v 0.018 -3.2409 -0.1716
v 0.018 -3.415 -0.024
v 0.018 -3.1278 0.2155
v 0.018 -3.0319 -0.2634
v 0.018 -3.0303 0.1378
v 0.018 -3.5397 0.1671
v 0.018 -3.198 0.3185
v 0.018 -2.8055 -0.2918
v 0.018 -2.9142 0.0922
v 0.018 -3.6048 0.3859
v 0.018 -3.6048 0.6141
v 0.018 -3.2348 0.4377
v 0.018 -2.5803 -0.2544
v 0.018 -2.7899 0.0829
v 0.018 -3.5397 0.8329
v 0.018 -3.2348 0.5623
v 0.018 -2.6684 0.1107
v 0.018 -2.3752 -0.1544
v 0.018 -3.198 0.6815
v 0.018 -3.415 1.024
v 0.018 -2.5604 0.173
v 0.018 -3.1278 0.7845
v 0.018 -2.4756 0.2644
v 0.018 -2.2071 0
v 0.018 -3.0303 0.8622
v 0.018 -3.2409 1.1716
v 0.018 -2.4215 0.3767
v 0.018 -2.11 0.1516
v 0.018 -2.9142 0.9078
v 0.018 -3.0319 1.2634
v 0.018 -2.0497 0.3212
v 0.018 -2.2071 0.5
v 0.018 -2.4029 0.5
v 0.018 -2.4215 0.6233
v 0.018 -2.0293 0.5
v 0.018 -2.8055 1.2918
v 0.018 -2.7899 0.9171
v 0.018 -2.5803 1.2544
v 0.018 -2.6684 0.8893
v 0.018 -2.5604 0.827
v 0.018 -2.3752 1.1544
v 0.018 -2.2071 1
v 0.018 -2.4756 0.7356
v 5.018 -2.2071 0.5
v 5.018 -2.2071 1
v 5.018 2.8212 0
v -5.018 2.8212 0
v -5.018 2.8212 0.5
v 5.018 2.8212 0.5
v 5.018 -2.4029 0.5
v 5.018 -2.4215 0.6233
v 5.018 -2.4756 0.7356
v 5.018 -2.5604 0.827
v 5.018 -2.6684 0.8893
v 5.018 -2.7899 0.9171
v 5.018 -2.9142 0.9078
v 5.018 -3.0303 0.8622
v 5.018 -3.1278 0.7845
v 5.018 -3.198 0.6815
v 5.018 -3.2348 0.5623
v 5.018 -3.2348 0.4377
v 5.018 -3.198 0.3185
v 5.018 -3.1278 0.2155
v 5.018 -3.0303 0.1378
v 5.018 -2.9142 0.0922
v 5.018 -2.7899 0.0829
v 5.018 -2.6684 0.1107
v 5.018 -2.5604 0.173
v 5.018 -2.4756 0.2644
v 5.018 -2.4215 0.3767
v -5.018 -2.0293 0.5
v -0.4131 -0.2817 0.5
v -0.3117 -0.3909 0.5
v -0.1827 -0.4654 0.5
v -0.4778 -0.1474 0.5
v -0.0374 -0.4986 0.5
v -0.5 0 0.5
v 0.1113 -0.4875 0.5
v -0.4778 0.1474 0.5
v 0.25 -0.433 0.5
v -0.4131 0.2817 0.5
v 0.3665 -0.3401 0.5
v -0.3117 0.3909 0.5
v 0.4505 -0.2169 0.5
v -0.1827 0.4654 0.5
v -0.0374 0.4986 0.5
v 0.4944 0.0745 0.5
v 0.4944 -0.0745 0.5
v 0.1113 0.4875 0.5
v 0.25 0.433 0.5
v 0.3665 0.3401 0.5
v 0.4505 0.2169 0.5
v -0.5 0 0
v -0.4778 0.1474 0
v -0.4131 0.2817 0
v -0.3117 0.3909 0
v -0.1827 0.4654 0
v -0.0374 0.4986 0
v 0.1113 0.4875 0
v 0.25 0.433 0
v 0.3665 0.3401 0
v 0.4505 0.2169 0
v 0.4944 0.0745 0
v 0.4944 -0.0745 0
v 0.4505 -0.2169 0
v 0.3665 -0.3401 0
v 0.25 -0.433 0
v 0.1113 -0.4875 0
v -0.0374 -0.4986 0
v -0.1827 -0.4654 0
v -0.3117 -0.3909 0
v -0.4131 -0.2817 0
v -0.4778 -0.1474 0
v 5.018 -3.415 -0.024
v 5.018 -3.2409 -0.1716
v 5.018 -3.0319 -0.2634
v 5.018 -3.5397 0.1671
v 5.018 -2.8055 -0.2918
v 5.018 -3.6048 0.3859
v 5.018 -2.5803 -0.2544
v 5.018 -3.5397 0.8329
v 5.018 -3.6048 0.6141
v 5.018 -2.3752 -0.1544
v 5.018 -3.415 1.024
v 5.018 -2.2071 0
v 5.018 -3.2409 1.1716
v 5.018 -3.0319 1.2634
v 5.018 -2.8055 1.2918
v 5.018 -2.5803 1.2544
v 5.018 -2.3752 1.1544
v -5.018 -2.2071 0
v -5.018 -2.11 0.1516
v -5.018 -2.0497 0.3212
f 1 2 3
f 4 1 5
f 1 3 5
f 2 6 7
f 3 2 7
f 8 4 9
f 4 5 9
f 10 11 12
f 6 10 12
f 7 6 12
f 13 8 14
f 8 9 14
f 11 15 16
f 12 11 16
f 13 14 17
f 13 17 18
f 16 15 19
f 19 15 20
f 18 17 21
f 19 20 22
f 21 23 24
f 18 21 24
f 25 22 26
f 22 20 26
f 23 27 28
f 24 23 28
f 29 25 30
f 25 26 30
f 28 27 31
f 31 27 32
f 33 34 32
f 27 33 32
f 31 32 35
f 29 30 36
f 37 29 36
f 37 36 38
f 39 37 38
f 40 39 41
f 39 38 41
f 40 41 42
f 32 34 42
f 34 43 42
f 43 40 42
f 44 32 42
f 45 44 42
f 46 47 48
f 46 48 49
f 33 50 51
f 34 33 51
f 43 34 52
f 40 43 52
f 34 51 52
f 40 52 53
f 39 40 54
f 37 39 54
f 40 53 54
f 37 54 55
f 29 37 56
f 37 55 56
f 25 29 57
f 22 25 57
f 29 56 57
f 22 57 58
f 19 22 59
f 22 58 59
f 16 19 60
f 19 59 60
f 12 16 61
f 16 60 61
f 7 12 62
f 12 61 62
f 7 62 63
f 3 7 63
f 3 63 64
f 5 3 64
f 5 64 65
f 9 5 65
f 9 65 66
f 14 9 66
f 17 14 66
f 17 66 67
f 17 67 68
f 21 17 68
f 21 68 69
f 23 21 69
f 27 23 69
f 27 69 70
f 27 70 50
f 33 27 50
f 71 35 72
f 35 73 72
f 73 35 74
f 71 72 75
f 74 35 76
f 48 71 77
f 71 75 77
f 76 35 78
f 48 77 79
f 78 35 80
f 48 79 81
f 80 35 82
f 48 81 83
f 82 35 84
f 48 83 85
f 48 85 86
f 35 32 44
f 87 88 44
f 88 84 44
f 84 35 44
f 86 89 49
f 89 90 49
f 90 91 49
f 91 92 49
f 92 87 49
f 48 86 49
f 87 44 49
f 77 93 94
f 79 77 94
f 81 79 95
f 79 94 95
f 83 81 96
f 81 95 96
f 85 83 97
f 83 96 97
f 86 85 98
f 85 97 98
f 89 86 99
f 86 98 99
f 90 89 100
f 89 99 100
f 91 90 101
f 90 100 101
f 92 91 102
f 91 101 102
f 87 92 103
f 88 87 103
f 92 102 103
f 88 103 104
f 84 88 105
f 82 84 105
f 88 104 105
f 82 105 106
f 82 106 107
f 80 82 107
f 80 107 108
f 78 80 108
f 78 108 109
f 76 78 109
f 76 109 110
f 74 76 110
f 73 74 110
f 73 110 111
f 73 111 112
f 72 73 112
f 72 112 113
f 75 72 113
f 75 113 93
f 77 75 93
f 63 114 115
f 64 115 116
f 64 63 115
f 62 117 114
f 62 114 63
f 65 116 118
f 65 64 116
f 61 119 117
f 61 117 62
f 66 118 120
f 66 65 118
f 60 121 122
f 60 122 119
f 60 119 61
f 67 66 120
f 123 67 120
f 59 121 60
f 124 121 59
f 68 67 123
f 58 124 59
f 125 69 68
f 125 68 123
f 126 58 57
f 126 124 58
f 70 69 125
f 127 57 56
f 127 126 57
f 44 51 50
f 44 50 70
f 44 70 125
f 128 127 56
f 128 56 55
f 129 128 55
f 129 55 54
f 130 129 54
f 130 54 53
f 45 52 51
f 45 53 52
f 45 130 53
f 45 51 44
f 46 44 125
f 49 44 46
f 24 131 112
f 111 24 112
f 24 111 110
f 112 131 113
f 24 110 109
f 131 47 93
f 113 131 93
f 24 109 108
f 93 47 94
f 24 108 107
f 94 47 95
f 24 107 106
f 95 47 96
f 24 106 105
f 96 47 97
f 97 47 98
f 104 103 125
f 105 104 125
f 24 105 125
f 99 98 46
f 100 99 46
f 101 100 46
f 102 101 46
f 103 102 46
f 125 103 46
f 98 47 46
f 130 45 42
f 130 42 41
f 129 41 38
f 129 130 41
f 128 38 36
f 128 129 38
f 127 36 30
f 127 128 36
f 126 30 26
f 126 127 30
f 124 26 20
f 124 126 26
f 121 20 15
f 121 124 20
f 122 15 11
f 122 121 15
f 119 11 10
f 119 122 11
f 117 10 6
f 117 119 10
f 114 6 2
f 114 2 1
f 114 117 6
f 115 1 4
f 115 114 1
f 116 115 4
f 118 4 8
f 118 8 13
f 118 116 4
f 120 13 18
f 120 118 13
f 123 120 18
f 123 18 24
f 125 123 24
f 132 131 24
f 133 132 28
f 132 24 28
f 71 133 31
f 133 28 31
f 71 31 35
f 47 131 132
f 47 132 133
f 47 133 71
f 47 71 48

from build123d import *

# Parameters (mm, degrees)
F0_W      = 10.0359702483
F0_H      = 5.6423433125
F1_DEPTH  = 1
F2_R      = 0.7919203143
F3_DEPTH  = 10.55
F4_DEPTH  = 5
F5_R      = 0.4182620548
F6_DEPTH  = 25
F8_D      = 1
F8_DEPTH  = 2
F8_TIP    = 0.3004303095
F9_W      = 5.0282278639
F9_H      = 0.5
F10_DEPTH = 25


with BuildPart() as f1:
    # F0 (on Top) → F1 (new body)
    with BuildSketch(Plane.XY):
        Rectangle(F0_W, F0_H)
    extrude(amount=F1_DEPTH)

    # F2 (on face) → F3 (cut)
    with BuildSketch(Plane.YZ.offset(5.0179851241)):
        with Locations((-2.8211716563, 0.5)):
            Circle(F2_R)
    extrude(amount=-F3_DEPTH, mode=Mode.SUBTRACT)

    # F2 (on face) → F4 (join)
    with BuildSketch(Plane.YZ.offset(5.0179851241)):
        with Locations((-2.8211716563, 0.5)):
            Circle(F2_R)
    extrude(amount=-F4_DEPTH)

    # F5 (on face) → F6 (cut)
    with BuildSketch(Plane.YZ.offset(5.0179851241)):
        with Locations((-2.8211716563, 0.5)):
            Circle(F5_R)
    extrude(amount=-F6_DEPTH, mode=Mode.SUBTRACT)

    # F8
    with Locations(Plane.XY.offset(1)):
        with Locations((0, 0)):
            Hole(F8_D / 2, depth=F8_DEPTH)
            with Locations((0, 0, -(F8_DEPTH + F8_TIP / 2))):  # 118° drill point
                Cone(0, F8_D / 2, F8_TIP, mode=Mode.SUBTRACT)

    # F9 (on face) → F10 (cut)
    with BuildSketch(Plane.YZ.offset(5.0179851241)):
        with Locations((0.3070577243, 0.75)):
            Rectangle(F9_W, F9_H)
    extrude(amount=-F10_DEPTH, mode=Mode.SUBTRACT)


solid = f1.part
